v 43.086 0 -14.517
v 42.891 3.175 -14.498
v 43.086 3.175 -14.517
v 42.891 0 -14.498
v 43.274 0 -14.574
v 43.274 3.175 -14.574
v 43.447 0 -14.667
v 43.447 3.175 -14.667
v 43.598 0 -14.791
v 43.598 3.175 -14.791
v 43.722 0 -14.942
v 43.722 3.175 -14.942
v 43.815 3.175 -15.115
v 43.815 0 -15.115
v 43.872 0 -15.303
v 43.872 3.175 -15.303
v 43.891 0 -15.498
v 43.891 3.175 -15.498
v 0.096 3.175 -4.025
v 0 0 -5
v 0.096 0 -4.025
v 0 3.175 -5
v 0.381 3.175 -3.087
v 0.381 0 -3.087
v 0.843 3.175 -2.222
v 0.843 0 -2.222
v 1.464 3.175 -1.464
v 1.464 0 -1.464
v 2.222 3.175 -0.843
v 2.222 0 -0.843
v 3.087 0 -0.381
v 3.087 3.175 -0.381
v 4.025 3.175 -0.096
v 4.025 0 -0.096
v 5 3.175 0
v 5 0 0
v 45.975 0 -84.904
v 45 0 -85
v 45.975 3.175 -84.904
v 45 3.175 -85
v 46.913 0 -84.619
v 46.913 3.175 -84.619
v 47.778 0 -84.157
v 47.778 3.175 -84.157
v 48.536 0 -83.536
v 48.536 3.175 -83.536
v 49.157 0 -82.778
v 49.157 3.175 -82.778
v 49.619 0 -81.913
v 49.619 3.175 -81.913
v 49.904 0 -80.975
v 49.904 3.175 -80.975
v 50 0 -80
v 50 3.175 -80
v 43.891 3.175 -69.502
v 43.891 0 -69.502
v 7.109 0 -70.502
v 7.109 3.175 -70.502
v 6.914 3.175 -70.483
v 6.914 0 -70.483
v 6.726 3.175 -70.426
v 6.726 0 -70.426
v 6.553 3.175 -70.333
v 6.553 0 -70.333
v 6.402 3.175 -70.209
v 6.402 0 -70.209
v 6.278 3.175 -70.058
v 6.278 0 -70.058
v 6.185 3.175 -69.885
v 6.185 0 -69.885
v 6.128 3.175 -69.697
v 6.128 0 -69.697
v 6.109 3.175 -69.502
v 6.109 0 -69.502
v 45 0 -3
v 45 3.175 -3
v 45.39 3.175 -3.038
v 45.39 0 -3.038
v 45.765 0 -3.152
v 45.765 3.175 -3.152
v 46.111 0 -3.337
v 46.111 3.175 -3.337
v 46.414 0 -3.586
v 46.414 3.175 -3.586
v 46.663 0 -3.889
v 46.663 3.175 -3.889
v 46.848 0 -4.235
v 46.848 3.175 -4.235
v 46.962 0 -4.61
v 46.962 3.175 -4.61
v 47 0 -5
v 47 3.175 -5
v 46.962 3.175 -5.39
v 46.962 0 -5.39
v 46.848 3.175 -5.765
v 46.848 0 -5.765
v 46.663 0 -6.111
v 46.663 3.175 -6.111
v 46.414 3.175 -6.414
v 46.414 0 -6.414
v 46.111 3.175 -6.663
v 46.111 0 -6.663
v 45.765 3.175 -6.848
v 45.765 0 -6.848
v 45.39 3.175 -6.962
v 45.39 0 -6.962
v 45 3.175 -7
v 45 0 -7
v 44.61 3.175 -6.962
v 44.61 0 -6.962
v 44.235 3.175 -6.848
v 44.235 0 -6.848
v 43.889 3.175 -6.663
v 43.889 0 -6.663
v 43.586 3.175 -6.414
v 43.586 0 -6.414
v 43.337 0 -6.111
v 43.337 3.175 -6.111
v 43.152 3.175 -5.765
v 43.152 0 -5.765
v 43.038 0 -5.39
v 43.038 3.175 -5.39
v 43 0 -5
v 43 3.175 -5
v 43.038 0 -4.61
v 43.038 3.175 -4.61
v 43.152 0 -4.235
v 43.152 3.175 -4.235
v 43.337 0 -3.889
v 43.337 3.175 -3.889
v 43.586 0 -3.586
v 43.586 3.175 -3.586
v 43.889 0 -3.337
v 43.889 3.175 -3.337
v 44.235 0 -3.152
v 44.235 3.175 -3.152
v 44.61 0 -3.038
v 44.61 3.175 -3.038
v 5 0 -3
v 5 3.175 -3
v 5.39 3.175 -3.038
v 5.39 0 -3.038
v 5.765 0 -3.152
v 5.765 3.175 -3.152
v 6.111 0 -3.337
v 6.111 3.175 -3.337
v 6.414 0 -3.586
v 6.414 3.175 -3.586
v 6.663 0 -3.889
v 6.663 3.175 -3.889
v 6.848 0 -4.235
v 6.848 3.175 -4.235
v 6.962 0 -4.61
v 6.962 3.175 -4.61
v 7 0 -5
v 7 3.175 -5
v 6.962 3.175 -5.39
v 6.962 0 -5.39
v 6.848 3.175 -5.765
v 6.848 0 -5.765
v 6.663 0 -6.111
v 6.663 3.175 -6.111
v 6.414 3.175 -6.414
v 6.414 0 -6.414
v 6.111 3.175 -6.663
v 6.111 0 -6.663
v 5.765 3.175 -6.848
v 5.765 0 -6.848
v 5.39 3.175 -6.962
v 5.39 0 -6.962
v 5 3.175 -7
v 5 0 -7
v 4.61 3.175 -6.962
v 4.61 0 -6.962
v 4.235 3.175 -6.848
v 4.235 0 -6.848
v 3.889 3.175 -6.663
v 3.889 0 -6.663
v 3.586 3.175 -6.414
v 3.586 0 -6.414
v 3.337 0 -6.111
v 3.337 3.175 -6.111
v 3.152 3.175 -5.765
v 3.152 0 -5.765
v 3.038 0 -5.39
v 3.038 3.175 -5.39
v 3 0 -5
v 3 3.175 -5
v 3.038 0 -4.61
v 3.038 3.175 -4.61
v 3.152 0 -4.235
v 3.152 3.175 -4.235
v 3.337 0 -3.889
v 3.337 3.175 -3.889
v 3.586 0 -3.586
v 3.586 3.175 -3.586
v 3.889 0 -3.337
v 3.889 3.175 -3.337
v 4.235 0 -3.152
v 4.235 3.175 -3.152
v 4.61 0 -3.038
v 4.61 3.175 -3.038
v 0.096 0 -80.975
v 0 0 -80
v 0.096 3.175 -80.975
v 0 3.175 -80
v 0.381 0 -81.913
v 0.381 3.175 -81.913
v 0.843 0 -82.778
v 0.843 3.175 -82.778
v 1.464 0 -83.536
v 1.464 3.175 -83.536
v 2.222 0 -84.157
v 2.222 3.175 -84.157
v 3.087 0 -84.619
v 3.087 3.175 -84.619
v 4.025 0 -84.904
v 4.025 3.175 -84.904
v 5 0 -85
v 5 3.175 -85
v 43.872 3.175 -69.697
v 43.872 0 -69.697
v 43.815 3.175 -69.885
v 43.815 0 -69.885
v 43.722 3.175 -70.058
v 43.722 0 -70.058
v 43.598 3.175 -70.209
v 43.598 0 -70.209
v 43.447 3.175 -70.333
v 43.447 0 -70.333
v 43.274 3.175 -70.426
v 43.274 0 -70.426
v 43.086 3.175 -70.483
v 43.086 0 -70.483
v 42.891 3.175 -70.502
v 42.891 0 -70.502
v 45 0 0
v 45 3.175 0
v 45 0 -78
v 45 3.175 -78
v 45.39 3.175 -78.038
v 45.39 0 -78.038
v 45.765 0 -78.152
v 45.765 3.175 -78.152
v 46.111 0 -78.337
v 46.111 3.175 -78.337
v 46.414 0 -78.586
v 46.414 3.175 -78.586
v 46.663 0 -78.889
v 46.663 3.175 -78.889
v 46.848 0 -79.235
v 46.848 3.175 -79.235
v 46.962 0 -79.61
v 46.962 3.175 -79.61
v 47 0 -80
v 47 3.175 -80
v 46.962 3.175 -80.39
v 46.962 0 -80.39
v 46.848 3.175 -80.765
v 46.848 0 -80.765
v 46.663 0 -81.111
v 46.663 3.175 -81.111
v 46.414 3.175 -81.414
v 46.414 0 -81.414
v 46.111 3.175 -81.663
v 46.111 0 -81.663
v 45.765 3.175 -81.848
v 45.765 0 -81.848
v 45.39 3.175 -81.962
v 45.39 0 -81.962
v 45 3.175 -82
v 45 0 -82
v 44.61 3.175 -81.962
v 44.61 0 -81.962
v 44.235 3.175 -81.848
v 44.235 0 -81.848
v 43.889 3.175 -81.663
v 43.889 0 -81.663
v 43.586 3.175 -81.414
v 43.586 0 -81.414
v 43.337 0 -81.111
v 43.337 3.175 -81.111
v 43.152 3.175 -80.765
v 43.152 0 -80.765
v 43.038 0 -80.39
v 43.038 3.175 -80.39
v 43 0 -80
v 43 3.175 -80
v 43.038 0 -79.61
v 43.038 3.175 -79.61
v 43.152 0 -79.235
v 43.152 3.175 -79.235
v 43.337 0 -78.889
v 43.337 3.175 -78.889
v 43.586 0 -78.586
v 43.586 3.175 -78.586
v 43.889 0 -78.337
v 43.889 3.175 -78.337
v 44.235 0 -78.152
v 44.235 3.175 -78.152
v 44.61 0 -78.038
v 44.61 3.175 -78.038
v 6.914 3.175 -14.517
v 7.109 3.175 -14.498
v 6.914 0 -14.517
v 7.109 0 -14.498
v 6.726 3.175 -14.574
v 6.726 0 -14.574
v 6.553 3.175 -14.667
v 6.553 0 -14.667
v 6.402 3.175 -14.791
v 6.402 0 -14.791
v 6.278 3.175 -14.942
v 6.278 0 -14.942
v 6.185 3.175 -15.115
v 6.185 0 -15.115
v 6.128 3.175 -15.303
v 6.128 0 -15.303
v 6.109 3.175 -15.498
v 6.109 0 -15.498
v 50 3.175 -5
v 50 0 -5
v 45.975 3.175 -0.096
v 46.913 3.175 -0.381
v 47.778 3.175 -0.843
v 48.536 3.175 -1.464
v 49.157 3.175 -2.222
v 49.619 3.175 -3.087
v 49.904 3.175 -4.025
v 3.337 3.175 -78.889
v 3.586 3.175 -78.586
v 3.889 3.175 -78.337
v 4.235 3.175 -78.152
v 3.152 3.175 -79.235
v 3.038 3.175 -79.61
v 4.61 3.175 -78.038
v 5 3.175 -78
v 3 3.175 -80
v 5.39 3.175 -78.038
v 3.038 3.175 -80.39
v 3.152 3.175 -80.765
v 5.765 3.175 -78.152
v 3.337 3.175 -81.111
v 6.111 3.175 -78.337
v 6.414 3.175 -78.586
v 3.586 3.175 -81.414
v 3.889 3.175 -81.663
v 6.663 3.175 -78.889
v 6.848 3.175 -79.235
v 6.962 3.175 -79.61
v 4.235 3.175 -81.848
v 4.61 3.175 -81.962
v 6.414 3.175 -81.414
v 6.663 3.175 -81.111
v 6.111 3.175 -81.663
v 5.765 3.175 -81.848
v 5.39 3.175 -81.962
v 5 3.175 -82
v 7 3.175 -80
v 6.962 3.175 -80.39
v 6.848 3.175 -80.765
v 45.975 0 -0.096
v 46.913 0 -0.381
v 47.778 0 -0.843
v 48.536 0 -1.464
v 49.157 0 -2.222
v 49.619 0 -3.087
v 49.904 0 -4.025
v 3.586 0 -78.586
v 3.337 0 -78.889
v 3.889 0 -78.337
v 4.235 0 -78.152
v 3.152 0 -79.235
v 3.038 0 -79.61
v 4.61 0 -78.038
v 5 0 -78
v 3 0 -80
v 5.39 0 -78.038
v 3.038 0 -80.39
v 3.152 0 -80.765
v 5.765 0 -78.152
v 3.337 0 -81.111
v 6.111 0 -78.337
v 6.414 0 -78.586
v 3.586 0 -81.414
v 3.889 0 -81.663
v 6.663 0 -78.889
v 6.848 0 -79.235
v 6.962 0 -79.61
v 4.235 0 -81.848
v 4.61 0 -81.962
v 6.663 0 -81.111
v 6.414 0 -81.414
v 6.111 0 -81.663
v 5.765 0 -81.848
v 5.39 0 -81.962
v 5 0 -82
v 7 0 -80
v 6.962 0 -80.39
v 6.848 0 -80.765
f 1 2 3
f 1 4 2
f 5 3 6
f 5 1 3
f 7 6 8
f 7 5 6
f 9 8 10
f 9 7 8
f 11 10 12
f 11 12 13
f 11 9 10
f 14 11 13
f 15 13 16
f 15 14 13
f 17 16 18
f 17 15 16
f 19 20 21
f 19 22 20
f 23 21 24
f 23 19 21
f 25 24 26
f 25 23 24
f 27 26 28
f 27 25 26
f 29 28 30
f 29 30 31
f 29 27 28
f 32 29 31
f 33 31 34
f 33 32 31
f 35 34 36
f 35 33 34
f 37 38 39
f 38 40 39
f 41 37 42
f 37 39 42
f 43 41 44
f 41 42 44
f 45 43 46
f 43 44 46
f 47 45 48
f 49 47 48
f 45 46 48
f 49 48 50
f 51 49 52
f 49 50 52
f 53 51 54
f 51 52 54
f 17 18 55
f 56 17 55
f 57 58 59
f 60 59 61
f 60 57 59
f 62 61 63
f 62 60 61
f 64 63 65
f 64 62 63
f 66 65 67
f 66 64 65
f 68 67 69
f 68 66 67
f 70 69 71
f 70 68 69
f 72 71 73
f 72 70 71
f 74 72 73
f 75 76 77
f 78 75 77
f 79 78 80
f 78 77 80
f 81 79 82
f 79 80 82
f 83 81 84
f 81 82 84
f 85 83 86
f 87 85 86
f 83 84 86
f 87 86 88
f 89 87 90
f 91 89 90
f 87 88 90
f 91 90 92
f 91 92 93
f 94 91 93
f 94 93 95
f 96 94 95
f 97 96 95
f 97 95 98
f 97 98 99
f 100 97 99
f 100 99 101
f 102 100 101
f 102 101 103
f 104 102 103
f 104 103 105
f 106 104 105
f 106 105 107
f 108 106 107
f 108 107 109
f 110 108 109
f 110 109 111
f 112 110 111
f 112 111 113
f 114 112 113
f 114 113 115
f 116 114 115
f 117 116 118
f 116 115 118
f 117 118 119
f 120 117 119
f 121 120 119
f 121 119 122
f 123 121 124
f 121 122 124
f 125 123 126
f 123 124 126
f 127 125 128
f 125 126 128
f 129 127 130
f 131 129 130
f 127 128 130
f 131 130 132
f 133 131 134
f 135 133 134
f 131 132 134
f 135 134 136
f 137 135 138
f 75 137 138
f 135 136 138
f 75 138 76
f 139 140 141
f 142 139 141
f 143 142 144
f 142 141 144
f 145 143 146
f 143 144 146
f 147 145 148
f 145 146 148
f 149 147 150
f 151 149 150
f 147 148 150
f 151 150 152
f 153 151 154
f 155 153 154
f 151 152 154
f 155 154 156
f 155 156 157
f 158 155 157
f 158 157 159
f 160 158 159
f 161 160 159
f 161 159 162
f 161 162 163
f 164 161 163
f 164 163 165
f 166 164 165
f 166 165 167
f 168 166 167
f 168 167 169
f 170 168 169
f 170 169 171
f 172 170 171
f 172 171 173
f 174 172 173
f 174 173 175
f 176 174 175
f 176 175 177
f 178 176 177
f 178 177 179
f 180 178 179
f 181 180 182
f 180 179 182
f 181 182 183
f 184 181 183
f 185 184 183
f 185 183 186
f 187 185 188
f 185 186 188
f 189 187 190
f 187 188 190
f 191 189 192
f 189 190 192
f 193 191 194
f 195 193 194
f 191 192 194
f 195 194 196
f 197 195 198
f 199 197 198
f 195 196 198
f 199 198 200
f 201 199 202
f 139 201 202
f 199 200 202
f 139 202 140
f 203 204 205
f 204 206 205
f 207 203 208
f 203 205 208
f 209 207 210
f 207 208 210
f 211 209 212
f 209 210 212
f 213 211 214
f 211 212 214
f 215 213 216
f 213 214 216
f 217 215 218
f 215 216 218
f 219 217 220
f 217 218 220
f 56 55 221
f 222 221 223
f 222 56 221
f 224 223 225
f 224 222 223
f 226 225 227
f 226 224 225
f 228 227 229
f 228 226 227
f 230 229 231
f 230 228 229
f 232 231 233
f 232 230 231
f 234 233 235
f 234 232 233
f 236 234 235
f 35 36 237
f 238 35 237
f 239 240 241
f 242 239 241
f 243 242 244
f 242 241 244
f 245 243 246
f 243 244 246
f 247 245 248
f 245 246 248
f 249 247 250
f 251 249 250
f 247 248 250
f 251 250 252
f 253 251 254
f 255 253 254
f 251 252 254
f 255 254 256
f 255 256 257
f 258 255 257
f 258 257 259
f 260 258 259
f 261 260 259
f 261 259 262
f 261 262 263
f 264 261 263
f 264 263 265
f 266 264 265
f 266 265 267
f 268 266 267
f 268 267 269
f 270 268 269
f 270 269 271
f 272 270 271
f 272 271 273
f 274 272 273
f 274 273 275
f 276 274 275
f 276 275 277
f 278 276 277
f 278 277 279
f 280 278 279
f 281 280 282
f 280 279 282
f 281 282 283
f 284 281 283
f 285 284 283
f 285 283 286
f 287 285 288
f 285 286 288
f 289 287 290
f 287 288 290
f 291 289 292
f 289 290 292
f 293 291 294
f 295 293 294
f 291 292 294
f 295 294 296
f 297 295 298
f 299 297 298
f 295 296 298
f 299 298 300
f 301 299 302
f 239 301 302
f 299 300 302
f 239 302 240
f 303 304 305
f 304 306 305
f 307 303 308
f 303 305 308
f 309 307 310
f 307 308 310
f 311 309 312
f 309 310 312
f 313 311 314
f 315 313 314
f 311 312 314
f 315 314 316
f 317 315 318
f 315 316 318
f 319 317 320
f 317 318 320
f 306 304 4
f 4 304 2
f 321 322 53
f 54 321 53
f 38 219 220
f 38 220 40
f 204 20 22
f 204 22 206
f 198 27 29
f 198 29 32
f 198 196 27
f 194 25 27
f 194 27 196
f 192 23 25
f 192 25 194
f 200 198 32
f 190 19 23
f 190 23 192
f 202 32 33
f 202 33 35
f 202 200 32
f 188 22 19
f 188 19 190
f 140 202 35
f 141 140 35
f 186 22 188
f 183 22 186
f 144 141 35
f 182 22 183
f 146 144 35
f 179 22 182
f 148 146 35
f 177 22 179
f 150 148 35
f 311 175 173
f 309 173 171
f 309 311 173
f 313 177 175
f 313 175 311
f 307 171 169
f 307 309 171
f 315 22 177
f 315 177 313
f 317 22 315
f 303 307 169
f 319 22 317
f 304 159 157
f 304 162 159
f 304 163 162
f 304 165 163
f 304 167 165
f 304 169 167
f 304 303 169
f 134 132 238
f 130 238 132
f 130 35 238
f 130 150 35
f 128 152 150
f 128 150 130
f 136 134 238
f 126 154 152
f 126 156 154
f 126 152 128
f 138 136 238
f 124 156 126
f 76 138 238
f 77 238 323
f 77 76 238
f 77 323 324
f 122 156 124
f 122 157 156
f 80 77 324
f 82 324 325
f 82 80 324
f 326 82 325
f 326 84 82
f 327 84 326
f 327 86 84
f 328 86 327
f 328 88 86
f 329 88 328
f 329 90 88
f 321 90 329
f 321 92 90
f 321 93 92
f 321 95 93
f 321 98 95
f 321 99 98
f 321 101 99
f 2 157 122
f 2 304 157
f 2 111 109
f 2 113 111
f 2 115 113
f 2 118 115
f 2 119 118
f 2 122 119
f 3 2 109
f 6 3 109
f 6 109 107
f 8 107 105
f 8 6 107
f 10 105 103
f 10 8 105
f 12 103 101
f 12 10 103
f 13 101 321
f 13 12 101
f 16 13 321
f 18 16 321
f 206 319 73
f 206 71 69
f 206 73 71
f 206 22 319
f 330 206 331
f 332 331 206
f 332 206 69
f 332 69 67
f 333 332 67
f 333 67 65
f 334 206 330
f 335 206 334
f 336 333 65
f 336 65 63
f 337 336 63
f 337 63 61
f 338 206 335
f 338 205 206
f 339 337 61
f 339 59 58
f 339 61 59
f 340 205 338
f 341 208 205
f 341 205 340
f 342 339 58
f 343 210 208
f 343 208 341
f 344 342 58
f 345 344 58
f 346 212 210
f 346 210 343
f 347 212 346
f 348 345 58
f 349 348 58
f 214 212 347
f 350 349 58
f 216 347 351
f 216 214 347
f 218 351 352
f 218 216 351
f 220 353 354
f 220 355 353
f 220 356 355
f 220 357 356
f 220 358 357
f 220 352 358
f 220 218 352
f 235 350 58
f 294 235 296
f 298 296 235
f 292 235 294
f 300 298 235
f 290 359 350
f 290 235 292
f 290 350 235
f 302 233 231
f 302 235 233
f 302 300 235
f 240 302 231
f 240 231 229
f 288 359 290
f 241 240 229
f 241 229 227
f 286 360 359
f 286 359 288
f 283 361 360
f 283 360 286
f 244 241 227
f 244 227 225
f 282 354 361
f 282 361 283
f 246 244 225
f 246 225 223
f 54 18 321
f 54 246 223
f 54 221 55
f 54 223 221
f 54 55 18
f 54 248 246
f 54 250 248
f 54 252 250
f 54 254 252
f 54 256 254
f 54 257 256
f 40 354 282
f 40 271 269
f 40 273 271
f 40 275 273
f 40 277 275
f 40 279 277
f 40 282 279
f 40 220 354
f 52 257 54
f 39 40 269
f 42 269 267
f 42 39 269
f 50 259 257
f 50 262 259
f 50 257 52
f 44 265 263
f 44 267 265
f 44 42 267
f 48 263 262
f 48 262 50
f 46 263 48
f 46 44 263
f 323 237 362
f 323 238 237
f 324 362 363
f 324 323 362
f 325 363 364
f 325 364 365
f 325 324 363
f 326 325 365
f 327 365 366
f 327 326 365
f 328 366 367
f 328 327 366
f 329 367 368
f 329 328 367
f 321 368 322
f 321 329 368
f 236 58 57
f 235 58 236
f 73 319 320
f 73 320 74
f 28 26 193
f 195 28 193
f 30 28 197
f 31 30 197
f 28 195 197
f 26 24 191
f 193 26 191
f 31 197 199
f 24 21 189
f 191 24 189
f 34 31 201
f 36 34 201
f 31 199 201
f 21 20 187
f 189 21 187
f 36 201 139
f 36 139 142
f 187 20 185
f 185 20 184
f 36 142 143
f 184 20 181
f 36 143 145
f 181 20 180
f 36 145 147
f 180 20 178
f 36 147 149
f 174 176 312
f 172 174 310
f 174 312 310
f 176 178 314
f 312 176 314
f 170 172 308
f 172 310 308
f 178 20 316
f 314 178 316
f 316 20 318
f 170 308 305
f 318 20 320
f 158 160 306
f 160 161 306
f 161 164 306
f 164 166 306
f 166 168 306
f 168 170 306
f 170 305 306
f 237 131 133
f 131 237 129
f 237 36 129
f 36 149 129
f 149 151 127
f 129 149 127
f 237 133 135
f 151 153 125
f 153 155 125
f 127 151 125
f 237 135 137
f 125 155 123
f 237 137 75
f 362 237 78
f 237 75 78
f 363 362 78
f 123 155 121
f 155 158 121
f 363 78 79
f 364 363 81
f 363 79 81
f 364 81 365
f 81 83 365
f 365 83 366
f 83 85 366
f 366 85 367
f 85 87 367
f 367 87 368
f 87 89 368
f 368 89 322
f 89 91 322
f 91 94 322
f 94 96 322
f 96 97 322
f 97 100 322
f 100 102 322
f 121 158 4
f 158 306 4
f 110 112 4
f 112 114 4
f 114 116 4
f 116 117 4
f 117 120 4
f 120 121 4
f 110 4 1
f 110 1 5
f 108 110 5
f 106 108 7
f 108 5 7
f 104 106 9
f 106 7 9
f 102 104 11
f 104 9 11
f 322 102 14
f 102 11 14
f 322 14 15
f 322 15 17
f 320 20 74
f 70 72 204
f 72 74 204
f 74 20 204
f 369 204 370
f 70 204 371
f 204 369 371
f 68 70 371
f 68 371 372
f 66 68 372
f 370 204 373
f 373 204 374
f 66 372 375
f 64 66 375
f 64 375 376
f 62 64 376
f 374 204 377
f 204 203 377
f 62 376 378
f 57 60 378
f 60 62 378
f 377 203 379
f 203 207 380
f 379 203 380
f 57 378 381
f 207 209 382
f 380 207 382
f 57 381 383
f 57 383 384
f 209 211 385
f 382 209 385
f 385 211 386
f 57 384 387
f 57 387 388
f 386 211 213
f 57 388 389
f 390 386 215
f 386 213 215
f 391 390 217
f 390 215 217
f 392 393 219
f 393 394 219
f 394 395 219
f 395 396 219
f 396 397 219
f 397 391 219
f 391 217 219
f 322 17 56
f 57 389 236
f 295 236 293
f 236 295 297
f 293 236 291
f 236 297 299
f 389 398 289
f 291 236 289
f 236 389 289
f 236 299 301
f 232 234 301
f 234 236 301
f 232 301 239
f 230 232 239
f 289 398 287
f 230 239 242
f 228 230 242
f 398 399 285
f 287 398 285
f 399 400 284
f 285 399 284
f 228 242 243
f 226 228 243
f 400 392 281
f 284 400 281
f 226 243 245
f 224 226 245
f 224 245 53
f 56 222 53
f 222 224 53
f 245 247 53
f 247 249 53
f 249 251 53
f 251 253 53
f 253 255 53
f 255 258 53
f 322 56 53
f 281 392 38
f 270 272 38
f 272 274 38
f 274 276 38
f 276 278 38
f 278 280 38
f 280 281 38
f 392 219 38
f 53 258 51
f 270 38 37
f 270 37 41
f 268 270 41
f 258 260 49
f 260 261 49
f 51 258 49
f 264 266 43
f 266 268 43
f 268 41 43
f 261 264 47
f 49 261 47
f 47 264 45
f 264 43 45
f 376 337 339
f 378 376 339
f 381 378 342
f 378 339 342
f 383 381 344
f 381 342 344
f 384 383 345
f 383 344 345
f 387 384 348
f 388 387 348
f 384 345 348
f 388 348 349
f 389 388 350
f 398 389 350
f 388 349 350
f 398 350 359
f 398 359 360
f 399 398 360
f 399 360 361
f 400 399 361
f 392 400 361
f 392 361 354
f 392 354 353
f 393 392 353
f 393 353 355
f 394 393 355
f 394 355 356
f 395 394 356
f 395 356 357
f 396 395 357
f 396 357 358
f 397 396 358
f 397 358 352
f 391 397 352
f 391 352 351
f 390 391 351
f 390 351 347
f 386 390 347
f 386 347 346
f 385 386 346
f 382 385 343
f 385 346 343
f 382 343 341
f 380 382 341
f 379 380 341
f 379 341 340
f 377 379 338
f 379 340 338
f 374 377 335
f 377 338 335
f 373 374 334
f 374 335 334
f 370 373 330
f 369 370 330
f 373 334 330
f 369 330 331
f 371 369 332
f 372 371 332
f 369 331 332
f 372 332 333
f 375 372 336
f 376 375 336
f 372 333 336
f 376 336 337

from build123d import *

# Parameters (mm, degrees)
SKETCH1_W           = 50
SKETCH1_H           = 85
BOSS_EXTRUDE1_DEPTH = 3.175
SKETCH3_W           = 37.782
SKETCH3_H           = 56.004
CUT_EXTRUDE1_DEPTH  = 99.666512176
FILLET2_R           = 1
FILLET3_R           = 5
SKETCH4_R           = 2
CUT_EXTRUDE2_DEPTH  = 99.666512176


with BuildPart() as part:
    # Sketch1 → Boss-Extrude1 (new body)
    with BuildSketch(Plane(origin=(0, 0, 0), x_dir=(1, 0, 0), z_dir=(0, 1, 0))):
        with Locations((25, 42.5)):
            Rectangle(SKETCH1_W, SKETCH1_H)
    extrude(amount=BOSS_EXTRUDE1_DEPTH)

    # Sketch3 → Cut-Extrude1 (cut, through all)
    with BuildSketch(Plane(origin=(0, 3.175, 0), x_dir=(1, 0, 0), z_dir=(0, 1, 0))):
        with Locations((25, 42.5)):
            Rectangle(SKETCH3_W, SKETCH3_H)
    extrude(amount=-CUT_EXTRUDE1_DEPTH, mode=Mode.SUBTRACT)

    # Fillet2
    fillet2_edges = [part.edges().sort_by_distance(p)[0] for p in [
        (6.109, 1.5875, -14.498),
        (6.109, 1.5875, -70.502),
        (43.891, 1.5875, -70.502),
        (43.891, 1.5875, -14.498),
    ]]
    fillet(fillet2_edges, radius=FILLET2_R)

    # Fillet3
    fillet3_edges = [part.edges().sort_by_distance(p)[0] for p in [
        (0, 1.5875, -85),
        (50, 1.5875, -85),
        (50, 1.5875, 0),
        (0, 1.5875, 0),
    ]]
    fillet(fillet3_edges, radius=FILLET3_R)

    # Sketch4 → Cut-Extrude2 (cut, through all)
    with BuildSketch(Plane(origin=(0, 3.175, 0), x_dir=(1, 0, 0), z_dir=(0, 1, 0))):
        with Locations(Location((5, 5, 0), (0, 0, 270))):
            Circle(SKETCH4_R)
        with Locations(Location((45, 5, 0), (0, 0, 270))):
            Circle(SKETCH4_R)
        with Locations(Location((45, 80, 0), (0, 0, 270))):
            Circle(SKETCH4_R)
        with Locations(Location((5, 80, 0), (0, 0, 270))):
            Circle(SKETCH4_R)
    extrude(amount=-CUT_EXTRUDE2_DEPTH, mode=Mode.SUBTRACT)


solid = part.part
